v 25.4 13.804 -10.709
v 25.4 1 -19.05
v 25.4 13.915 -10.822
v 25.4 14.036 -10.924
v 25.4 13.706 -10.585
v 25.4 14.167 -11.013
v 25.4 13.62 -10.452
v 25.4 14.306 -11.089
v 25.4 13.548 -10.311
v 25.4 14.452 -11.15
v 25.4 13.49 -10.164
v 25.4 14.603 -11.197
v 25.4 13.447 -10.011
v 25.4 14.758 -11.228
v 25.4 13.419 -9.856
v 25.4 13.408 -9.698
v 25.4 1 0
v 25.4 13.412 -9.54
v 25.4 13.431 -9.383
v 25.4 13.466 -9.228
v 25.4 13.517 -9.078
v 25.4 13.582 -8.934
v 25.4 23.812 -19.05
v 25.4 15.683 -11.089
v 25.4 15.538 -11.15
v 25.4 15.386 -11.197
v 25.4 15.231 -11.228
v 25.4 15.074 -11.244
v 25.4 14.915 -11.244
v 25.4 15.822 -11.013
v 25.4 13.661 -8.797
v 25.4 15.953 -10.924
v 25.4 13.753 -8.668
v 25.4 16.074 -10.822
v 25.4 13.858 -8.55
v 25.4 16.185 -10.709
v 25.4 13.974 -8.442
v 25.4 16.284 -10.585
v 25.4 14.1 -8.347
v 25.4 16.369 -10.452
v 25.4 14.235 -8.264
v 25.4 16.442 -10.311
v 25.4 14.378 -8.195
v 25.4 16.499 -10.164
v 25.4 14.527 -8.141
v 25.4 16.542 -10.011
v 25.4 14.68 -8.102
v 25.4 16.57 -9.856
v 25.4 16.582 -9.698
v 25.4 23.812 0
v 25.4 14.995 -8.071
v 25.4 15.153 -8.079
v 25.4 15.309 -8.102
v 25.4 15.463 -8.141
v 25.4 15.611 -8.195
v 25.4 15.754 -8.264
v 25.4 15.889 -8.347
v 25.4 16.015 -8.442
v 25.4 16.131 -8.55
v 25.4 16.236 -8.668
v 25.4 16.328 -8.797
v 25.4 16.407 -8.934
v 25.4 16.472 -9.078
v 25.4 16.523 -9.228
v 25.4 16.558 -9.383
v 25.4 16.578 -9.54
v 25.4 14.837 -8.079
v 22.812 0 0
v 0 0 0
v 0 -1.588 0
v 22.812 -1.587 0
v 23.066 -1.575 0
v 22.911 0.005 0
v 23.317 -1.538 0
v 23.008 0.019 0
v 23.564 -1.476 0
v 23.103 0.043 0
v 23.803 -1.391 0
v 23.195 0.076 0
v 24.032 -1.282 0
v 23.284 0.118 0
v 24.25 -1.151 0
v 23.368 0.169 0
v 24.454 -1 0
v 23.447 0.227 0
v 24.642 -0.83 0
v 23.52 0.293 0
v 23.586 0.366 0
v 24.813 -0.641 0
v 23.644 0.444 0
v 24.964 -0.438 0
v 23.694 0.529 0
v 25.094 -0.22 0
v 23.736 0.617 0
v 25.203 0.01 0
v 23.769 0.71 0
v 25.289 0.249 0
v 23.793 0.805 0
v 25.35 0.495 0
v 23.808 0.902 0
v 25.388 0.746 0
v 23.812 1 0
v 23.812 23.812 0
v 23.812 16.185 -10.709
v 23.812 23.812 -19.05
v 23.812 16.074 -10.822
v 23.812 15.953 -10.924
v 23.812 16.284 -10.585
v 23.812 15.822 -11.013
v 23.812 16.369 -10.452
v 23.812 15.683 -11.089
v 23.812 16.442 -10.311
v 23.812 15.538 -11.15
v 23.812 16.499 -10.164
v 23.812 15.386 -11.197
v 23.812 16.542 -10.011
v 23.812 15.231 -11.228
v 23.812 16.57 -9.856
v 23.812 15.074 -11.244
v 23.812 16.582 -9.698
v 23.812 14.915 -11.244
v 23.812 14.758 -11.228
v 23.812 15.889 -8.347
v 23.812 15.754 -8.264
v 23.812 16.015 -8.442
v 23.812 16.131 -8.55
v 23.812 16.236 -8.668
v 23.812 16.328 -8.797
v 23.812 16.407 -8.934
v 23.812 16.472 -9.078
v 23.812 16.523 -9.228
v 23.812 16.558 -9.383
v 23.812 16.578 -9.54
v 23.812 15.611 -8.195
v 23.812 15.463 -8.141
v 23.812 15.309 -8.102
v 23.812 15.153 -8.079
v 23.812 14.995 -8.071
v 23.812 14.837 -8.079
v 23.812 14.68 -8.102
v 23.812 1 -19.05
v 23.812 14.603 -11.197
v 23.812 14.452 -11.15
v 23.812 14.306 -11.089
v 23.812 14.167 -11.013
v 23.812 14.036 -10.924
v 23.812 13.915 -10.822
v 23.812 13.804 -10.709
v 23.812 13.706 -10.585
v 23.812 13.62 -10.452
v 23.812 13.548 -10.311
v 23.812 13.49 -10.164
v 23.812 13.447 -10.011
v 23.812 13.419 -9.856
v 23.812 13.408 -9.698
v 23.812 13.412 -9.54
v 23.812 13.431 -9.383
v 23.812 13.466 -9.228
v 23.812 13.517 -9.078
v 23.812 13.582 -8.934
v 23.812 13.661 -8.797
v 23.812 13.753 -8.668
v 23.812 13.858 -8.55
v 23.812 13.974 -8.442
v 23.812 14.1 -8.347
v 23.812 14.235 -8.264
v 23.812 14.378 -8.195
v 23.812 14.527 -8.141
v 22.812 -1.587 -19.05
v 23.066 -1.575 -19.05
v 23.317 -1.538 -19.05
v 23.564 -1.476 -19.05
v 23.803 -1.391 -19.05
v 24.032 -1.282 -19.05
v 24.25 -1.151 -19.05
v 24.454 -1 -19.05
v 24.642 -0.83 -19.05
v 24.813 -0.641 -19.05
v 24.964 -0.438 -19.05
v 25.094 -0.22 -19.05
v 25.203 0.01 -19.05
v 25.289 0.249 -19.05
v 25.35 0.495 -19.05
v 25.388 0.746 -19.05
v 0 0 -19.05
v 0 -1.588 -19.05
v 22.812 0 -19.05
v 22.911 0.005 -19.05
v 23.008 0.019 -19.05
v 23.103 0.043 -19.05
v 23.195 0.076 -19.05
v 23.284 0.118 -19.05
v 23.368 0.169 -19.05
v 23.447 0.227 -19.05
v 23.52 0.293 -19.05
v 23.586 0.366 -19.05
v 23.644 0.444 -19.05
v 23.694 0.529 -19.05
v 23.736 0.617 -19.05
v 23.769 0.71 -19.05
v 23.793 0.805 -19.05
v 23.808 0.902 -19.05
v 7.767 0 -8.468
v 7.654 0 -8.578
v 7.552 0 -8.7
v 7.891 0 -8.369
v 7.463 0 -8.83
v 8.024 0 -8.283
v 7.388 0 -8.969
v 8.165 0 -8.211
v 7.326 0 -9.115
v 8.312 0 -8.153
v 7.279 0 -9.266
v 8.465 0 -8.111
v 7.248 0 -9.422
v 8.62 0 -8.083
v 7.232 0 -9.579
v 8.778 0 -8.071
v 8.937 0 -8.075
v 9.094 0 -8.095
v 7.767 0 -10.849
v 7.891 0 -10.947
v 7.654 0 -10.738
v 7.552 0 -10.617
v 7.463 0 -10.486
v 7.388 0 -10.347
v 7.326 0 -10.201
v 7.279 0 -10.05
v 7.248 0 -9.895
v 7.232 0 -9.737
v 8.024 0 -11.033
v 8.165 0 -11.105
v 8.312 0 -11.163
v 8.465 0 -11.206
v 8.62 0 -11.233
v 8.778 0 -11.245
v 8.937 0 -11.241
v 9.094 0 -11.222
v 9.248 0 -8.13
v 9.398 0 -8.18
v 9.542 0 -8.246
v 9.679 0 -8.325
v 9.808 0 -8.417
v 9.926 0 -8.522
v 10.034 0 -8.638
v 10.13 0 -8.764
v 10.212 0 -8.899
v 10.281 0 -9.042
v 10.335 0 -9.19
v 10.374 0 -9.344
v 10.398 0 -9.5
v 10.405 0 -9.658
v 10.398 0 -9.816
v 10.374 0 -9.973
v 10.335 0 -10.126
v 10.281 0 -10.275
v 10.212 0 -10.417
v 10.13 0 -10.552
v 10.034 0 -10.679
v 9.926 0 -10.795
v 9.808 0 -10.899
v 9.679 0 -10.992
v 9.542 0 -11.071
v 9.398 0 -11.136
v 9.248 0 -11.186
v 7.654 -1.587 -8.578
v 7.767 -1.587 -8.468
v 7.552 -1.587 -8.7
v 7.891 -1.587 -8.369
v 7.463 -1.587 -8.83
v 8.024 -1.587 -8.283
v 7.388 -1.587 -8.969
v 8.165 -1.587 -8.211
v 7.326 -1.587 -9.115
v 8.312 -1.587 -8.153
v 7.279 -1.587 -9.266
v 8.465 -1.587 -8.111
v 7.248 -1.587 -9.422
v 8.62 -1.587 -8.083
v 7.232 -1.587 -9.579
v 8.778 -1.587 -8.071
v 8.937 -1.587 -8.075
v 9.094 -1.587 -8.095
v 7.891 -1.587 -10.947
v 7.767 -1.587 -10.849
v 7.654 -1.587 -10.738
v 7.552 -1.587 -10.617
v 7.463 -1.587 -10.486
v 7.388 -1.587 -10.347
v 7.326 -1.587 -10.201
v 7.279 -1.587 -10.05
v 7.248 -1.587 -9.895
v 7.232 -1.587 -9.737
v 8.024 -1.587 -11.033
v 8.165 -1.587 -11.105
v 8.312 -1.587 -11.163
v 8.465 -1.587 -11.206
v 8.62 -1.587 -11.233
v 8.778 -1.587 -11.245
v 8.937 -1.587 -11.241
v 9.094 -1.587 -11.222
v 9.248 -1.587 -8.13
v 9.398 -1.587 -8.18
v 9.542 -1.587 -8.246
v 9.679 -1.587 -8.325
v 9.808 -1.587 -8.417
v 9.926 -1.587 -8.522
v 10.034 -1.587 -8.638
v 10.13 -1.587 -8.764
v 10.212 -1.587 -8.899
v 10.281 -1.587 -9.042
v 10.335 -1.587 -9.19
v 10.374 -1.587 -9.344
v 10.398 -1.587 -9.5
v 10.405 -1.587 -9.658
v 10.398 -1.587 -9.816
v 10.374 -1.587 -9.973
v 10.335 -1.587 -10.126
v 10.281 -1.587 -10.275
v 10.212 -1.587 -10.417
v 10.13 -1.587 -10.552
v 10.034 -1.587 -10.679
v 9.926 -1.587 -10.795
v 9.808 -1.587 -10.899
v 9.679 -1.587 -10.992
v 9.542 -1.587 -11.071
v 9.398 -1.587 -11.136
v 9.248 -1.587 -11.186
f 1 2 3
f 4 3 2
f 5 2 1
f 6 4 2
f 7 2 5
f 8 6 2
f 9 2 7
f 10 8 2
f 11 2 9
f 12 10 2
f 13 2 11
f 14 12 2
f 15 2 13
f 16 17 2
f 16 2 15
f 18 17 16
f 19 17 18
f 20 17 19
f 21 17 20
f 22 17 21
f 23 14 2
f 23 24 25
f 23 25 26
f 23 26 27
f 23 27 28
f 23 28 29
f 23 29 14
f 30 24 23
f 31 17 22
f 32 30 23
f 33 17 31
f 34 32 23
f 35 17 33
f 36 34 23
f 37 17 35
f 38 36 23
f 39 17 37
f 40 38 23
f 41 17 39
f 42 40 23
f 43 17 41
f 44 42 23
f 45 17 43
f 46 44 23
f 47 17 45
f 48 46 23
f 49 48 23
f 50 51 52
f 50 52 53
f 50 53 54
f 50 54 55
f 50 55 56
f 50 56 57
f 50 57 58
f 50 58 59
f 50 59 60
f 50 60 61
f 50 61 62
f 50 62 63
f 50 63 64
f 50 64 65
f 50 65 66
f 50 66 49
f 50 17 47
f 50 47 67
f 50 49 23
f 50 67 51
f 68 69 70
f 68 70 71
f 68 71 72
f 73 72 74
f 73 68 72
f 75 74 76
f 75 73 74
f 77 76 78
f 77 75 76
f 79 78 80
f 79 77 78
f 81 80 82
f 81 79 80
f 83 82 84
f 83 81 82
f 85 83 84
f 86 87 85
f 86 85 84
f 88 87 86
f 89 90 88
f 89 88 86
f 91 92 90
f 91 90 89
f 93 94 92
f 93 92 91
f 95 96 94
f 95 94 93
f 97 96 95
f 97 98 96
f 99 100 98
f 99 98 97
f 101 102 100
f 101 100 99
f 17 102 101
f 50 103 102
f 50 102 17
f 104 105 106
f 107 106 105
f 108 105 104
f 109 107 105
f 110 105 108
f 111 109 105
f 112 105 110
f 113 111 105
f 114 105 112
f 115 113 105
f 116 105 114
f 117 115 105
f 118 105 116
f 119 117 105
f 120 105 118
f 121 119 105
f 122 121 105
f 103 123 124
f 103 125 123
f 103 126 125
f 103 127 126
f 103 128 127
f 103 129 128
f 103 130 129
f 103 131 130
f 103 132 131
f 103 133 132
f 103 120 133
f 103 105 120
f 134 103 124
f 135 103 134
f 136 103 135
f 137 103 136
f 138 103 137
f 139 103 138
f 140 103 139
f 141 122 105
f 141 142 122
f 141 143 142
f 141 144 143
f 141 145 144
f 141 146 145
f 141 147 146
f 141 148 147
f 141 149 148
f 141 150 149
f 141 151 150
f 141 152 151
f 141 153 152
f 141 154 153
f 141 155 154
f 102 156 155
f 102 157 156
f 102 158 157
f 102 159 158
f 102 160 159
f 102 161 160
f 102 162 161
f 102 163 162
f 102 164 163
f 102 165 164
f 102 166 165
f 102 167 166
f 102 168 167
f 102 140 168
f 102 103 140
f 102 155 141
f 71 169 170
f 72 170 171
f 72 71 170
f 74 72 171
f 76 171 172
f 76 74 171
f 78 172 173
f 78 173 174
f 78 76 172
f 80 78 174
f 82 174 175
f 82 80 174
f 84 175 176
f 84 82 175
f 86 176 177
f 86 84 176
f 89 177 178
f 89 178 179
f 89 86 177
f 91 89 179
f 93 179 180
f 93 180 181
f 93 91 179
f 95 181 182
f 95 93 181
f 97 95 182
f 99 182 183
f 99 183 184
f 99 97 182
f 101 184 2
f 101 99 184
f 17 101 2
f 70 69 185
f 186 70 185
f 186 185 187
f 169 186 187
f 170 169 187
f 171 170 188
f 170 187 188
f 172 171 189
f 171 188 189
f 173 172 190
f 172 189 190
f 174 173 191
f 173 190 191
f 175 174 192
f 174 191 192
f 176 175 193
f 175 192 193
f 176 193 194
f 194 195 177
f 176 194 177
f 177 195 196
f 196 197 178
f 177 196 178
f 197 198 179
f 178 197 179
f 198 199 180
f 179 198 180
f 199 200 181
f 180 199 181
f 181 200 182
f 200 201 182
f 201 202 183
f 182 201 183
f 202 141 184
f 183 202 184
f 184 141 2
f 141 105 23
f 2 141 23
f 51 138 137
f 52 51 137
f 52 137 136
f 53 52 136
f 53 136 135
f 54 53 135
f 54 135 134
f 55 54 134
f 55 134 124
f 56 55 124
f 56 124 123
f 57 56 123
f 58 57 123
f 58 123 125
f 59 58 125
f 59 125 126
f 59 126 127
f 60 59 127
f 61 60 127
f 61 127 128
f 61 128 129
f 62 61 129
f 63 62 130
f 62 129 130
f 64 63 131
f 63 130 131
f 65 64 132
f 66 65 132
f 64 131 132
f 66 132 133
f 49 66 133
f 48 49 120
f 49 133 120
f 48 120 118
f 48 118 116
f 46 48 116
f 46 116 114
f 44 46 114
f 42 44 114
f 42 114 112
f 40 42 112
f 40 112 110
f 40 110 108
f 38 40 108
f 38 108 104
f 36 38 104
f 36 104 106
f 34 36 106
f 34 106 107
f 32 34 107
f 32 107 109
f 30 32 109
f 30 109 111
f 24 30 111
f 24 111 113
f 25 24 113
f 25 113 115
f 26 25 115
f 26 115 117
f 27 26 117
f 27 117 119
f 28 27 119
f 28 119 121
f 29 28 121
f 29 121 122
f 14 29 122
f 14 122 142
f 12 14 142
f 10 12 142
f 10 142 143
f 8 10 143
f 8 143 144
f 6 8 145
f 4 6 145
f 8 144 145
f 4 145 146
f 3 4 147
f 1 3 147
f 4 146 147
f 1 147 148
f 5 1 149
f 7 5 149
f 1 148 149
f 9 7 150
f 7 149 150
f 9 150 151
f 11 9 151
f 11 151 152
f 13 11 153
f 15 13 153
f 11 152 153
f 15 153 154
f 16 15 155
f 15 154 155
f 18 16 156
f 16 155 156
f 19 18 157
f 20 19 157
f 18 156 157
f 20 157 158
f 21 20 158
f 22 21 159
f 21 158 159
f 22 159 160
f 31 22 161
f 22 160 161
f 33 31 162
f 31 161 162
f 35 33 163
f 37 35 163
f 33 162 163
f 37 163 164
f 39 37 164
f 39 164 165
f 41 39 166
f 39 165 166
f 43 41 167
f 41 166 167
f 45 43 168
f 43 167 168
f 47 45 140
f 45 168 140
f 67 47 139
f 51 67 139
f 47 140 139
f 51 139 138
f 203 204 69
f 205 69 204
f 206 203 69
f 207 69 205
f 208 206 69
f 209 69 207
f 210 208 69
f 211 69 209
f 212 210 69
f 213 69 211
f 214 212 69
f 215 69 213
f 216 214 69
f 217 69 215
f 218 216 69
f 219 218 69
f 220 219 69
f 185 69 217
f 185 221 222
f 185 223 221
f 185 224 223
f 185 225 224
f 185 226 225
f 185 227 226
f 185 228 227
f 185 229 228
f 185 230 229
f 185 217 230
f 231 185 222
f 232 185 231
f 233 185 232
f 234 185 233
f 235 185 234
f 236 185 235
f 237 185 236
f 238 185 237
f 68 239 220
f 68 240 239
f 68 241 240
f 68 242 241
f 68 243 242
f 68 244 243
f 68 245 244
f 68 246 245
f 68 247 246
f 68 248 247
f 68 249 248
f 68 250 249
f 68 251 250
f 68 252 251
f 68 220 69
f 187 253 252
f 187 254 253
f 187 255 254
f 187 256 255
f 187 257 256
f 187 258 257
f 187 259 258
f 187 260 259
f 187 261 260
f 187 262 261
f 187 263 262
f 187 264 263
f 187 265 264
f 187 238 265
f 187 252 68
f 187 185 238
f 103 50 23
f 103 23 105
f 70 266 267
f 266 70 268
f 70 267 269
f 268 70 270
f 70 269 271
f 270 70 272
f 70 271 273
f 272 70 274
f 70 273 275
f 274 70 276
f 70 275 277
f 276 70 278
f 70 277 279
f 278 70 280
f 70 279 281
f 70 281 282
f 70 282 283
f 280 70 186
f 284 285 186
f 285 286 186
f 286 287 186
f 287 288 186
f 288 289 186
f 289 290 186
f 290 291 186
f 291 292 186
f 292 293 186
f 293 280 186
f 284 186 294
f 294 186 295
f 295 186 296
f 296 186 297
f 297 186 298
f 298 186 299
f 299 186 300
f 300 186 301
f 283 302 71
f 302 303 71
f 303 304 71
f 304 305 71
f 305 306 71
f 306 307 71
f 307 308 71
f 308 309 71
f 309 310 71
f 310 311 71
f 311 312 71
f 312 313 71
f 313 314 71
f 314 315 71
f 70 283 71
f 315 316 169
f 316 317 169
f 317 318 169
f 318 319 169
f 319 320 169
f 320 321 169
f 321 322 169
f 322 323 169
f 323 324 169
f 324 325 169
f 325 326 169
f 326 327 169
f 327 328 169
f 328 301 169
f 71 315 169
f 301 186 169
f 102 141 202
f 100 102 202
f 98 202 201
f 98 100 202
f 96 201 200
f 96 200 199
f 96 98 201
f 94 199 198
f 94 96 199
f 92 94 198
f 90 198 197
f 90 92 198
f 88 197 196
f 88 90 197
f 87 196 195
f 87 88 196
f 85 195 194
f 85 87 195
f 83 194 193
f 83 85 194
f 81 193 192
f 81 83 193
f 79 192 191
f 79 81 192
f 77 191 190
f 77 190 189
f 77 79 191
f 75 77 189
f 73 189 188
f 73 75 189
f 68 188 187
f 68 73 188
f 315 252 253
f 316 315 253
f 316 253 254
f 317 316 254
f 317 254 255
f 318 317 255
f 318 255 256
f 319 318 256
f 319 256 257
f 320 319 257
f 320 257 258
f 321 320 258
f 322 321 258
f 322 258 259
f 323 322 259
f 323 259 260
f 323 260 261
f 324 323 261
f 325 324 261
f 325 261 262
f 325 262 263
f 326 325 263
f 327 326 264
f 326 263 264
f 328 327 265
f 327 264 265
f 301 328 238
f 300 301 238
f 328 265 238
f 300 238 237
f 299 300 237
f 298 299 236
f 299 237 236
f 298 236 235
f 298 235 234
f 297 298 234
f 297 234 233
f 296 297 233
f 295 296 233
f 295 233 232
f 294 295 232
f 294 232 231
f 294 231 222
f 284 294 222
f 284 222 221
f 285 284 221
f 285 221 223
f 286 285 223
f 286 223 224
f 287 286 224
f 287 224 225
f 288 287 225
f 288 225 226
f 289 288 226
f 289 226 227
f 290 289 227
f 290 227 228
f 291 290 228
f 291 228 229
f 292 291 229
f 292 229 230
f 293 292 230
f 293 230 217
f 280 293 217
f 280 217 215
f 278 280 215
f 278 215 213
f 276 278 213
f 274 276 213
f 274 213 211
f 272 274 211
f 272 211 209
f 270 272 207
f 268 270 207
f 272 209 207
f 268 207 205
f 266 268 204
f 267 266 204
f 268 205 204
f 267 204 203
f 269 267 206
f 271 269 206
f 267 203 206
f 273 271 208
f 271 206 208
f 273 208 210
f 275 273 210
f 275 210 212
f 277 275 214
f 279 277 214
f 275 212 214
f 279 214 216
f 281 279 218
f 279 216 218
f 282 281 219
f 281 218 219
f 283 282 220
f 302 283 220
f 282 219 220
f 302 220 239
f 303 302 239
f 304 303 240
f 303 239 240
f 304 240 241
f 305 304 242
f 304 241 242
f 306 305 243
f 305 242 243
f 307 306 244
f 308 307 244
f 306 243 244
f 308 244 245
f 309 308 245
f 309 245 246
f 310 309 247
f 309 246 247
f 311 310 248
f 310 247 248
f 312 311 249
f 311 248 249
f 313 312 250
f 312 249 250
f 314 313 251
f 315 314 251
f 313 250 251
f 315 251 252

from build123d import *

# Parameters (mm, degrees)
SKETCH1_W                    = 25.4
SKETCH1_H                    = 19.05
BASE_FLANGE1_DEPTH           = 1.5875
EDGE_FLANGE1_STRIP_W         = 8.35
EDGE_FLANGE1_STRIP_H         = 1.5875
EDGE_FLANGE1_STRIP_CUT_DEPTH = 19.05
EDGE_FLANGE1_DEPTH           = 19.05
F_1_8_0_125_DIAMETER_HOLE1_D = 3.175
F_1_8_0_125_DIAMETER_HOLE2_D = 3.175


# Sheet-metal steps are written as plain solids
with BuildPart() as part:
    # Sketch1 → Base-Flange1 (new body)
    with BuildSketch(Plane(origin=(0, 0, 0), x_dir=(1, 0, 0), z_dir=(0, 1, 0))):
        with Locations((12.7, 9.525)):
            Rectangle(SKETCH1_W, SKETCH1_H)
    extrude(amount=-BASE_FLANGE1_DEPTH)

    # Edge-Flange1 strip (across the edge) → Edge-Flange1 strip cut (cut)
    with BuildSketch(Plane(origin=(25.4, 0, 0), x_dir=(-1, 0, 0), z_dir=(0, 0, -1))):
        with Locations((-1.5875, -0.79375)):
            Rectangle(EDGE_FLANGE1_STRIP_W, EDGE_FLANGE1_STRIP_H)
    extrude(amount=EDGE_FLANGE1_STRIP_CUT_DEPTH, mode=Mode.SUBTRACT)

    # Edge-Flange1 section (across the edge) → Edge-Flange1 (add)
    with BuildSketch(Plane(origin=(25.4, 0, 0), x_dir=(-1, 0, 0), z_dir=(0, 0, -1))):
        with BuildLine():
            Line((0, 1), (0, 23.8125))
            Line((0, 23.8125), (1.5875, 23.8125))
            Line((1.5875, 23.8125), (1.5875, 1))
            ThreePointArc((1.5875, 1), (1.880393219, 0.292893219), (2.5875, 0))
            Line((2.5875, 0), (2.5875, -1.5875))
            ThreePointArc((2.5875, -1.5875), (0.757861204, -0.829638796), (0, 1))
        make_face()
    extrude(amount=EDGE_FLANGE1_DEPTH)

    # 1/8 (0.125) Diameter Hole1 (through all)
    with Locations(Plane(origin=(25.4, 0, 0), x_dir=(0, 0, -1), z_dir=(1, 0, 0))):
        with Locations((9.658223344, 14.994606781)):
            Hole(F_1_8_0_125_DIAMETER_HOLE1_D / 2)

    # 1/8 (0.125) Diameter Hole2 (through all)
    with Locations(Plane(origin=(0, -1.5875, 0), x_dir=(-1, 0, 0), z_dir=(0, -1, 0))):
        with Locations((-8.817893219, 9.658223344)):
            Hole(F_1_8_0_125_DIAMETER_HOLE2_D / 2)


solid = part.part
